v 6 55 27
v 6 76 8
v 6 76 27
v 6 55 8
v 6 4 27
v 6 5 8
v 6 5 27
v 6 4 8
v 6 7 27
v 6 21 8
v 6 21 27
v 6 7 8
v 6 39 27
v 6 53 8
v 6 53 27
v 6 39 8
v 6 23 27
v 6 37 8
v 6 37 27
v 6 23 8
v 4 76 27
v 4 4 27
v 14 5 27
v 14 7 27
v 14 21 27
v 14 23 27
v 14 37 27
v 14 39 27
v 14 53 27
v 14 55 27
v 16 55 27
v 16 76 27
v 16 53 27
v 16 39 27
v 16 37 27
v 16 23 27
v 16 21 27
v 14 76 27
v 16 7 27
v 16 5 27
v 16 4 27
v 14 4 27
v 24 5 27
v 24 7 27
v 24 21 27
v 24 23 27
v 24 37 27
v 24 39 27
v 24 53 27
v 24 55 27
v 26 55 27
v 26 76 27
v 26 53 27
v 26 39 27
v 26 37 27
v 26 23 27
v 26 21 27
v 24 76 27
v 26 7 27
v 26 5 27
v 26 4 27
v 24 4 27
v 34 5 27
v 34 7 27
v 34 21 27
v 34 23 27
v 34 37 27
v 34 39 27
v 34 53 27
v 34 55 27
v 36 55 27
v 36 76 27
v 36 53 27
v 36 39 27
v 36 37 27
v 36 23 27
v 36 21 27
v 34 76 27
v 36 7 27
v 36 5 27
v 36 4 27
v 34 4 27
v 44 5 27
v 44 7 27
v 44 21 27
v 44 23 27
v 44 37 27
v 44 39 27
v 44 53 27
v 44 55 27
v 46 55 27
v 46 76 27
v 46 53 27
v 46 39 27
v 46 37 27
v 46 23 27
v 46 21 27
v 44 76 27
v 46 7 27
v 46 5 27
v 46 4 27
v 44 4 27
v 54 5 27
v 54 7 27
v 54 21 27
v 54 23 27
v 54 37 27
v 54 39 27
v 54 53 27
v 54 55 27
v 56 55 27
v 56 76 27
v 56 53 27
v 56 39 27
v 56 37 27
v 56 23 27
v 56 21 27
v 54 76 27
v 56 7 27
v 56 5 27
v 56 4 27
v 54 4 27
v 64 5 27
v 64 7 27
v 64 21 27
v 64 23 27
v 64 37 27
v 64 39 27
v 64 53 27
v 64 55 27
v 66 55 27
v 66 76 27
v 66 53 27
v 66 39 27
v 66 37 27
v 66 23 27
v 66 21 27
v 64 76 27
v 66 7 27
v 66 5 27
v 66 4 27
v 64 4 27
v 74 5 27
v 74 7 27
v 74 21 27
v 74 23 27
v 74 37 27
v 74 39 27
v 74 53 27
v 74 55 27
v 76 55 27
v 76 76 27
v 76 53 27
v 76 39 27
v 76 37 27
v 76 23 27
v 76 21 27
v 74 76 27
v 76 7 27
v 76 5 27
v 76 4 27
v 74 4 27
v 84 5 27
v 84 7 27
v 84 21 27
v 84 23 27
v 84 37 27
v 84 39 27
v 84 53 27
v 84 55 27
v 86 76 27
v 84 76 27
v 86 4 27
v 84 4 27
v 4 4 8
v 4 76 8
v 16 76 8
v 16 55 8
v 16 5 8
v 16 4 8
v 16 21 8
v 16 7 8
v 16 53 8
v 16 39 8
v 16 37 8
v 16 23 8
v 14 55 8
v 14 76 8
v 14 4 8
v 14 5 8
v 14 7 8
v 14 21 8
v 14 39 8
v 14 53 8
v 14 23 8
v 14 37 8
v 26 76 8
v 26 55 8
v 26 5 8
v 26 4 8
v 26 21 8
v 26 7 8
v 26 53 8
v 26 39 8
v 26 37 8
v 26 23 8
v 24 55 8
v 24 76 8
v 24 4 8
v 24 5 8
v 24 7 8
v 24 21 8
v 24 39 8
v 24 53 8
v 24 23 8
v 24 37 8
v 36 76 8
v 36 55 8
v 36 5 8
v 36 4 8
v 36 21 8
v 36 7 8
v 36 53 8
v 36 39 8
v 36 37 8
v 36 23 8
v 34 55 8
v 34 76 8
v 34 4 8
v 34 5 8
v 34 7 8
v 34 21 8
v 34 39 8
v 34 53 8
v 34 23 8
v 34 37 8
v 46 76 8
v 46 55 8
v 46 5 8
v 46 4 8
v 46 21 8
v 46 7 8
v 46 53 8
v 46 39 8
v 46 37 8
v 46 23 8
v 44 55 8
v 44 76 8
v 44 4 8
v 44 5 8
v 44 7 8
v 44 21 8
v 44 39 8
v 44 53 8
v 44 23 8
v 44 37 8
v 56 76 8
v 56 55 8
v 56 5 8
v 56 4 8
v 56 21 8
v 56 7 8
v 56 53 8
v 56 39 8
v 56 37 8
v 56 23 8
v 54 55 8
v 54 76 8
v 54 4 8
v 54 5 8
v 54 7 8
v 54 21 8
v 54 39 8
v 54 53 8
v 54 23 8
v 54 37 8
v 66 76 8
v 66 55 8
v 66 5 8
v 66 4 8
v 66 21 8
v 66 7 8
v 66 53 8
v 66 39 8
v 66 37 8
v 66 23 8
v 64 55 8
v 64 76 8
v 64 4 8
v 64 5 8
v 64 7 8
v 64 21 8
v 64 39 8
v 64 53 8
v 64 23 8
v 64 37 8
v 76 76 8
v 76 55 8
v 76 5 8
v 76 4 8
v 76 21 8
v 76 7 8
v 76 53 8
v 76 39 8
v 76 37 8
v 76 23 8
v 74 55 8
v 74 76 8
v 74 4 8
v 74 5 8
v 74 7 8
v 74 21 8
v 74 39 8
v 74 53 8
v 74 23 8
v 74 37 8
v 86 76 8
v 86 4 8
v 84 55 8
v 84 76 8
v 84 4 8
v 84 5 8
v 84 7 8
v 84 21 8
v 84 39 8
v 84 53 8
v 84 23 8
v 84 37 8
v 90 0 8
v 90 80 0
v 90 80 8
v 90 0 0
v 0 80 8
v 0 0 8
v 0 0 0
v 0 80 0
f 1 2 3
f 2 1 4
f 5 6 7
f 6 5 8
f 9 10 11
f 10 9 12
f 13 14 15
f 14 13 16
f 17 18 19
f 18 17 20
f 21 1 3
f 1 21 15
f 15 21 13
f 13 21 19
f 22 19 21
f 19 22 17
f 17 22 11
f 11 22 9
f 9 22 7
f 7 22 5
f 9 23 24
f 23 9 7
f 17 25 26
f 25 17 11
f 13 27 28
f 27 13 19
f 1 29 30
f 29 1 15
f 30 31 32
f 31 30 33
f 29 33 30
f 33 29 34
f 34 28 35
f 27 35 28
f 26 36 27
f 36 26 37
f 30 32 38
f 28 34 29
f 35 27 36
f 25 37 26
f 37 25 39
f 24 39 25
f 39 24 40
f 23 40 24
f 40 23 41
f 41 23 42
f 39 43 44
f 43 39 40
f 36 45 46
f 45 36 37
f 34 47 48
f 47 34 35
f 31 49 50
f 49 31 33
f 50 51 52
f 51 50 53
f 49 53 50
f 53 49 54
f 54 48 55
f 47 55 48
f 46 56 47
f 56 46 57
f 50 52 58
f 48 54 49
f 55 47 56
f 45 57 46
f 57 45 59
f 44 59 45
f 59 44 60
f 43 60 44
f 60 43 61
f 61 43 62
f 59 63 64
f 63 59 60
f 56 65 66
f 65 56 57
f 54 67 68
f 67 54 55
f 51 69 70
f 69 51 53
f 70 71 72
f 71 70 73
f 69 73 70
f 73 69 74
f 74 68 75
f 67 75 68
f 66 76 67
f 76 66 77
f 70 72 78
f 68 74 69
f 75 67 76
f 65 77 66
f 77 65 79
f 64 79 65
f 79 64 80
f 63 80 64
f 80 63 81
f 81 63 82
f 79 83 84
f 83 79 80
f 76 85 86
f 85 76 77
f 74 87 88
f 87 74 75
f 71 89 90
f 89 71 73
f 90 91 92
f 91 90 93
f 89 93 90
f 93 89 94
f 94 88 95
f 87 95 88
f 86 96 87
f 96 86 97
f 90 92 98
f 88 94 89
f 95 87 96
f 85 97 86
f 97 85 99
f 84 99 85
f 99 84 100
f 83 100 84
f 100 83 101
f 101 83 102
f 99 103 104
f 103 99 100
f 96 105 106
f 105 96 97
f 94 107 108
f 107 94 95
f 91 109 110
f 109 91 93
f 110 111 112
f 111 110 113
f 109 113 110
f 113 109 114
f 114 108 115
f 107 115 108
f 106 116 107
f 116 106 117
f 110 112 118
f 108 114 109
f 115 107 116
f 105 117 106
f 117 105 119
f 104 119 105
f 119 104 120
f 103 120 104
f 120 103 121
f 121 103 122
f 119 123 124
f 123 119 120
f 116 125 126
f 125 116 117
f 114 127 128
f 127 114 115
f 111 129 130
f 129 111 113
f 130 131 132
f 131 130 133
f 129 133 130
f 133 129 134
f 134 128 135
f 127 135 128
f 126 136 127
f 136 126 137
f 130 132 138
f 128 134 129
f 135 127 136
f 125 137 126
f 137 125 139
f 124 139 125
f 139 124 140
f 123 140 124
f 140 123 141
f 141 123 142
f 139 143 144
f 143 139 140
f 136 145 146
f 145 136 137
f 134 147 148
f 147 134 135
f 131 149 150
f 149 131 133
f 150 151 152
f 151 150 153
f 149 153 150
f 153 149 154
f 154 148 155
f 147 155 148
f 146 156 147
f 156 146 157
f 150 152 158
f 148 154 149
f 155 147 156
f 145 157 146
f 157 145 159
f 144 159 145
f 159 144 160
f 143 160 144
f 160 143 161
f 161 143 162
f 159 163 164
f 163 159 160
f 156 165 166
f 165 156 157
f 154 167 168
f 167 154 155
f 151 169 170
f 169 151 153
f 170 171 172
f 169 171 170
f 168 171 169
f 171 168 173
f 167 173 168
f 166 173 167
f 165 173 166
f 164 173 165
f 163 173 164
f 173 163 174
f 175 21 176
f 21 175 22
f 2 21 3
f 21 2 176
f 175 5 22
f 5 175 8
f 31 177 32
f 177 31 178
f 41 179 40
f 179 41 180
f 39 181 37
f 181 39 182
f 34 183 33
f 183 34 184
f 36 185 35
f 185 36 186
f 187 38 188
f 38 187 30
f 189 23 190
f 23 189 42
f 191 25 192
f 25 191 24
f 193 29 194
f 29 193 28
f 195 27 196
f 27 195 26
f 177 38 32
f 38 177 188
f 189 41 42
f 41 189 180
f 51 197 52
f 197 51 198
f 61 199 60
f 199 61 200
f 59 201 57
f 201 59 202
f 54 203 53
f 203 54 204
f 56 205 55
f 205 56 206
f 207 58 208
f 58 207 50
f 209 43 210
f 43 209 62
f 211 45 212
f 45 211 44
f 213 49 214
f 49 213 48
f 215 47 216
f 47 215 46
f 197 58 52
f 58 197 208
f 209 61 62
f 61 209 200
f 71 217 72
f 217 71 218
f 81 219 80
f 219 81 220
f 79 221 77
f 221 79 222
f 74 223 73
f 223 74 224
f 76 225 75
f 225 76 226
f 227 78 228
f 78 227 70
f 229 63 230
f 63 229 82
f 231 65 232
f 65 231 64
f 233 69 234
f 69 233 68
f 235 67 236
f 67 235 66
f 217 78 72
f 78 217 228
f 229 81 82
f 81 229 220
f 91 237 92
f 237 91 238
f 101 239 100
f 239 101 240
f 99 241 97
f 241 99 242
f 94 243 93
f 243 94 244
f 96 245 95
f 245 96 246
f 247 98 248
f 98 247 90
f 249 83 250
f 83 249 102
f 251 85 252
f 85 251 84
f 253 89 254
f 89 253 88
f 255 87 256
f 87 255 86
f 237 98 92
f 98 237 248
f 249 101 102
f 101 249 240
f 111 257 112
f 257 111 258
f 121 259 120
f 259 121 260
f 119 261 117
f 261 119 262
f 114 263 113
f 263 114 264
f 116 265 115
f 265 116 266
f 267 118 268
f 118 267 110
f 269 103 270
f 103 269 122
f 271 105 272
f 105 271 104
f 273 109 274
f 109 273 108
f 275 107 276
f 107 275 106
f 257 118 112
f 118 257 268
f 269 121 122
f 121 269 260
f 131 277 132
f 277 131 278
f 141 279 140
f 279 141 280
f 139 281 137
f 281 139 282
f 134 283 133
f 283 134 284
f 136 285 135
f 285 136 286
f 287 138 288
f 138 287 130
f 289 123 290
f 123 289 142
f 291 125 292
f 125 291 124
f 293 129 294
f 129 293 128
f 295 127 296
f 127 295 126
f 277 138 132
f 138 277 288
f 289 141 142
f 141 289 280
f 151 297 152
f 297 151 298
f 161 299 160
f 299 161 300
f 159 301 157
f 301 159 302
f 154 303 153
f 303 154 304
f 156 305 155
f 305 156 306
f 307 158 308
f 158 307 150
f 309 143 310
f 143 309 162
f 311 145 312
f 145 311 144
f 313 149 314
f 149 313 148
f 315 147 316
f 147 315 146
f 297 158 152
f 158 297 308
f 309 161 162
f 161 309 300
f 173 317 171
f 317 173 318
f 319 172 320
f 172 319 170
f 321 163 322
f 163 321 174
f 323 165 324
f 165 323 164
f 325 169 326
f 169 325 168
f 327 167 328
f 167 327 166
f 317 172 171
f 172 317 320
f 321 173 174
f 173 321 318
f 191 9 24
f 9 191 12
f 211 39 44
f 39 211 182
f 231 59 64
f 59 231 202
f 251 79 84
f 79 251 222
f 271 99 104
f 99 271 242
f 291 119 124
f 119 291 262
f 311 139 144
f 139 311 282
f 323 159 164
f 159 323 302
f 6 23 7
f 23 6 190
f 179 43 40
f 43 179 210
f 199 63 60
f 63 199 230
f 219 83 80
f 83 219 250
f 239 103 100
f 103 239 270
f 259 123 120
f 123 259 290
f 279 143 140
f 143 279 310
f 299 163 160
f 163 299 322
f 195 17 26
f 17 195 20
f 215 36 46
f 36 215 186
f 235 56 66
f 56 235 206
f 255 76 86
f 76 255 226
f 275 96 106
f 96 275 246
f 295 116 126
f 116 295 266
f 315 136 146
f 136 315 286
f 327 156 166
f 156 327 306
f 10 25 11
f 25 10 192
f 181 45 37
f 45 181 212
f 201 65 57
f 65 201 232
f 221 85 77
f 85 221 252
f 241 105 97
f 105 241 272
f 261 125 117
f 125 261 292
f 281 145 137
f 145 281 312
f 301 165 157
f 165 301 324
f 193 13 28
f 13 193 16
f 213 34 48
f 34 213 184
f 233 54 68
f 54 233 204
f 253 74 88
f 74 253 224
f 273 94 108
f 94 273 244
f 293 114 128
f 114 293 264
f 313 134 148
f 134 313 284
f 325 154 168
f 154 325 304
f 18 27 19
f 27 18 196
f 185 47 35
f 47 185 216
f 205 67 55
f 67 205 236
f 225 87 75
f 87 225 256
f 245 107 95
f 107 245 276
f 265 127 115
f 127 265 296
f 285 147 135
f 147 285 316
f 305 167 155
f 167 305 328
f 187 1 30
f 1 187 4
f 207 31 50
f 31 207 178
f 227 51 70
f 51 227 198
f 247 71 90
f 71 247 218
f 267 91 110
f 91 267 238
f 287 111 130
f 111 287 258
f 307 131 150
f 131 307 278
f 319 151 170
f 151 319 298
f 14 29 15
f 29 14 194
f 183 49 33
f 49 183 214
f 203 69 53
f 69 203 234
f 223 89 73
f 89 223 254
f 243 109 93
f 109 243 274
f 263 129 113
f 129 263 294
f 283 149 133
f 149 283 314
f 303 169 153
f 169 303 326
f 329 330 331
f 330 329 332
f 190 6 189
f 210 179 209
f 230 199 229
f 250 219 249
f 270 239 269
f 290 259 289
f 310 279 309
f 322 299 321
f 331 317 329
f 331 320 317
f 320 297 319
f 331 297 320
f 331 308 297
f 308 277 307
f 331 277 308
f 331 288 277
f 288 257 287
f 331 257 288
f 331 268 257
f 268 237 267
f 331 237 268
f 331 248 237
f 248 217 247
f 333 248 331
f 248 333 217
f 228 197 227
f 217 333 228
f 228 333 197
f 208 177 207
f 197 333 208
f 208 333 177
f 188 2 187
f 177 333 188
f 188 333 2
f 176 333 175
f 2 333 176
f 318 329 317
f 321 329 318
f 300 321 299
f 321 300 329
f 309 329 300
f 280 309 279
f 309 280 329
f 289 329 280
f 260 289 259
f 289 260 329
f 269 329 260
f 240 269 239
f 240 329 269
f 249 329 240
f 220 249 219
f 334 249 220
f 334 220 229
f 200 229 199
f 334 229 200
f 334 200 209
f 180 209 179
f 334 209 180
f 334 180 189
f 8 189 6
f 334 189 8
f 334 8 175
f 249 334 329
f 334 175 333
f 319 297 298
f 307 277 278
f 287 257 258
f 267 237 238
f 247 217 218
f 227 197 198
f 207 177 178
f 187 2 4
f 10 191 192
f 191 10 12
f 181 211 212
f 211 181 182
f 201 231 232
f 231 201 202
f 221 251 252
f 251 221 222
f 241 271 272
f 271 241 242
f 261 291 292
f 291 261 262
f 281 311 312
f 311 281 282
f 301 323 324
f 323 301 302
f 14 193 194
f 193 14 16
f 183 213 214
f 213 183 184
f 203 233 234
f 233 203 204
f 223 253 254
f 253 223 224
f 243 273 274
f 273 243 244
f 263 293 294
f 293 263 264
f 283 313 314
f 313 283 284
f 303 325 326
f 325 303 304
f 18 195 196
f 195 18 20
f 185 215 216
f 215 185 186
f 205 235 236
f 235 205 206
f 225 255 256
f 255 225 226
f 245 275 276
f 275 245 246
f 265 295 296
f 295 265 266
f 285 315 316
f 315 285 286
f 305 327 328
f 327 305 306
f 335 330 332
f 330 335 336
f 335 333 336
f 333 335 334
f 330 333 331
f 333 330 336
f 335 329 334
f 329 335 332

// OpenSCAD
$fn = 32;

// ----------------------------------------------------------------------
// Heatsink: cross fin block
// ----------------------------------------------------------------------

// --- parameters (mm) ---
base_l = 90;              // base length, X
base_w = 80;              // base width, Y
base_t = 8;               // base plate thickness
fin_h = 20;               // fin height above the base
fin_t = 2;                // fin thickness
edge = 4;                 // margin from the base ends
pitch = 10;               // fin pitch
rib_pitch = 16;           // cross rib pitch

n_fins = floor((base_l - 2 * edge - fin_t) / pitch) + 1;  // fin count
total_h = base_t + fin_h - 1;  // overall height
n_ribs = floor((base_w - 2 * edge) / rib_pitch);  // rib count

union() {
  cube([base_l, base_w, base_t]);
  for (i = [0 : n_fins - 1])
    translate([edge + i * pitch, edge, base_t - 1])
      cube([fin_t, base_w - 2 * edge, fin_h]);
  for (i = [0 : n_ribs - 1])
    translate([edge, edge + 1 + i * rib_pitch, base_t - 1])
      cube([base_l - 2 * edge, fin_t, fin_h]);
}
